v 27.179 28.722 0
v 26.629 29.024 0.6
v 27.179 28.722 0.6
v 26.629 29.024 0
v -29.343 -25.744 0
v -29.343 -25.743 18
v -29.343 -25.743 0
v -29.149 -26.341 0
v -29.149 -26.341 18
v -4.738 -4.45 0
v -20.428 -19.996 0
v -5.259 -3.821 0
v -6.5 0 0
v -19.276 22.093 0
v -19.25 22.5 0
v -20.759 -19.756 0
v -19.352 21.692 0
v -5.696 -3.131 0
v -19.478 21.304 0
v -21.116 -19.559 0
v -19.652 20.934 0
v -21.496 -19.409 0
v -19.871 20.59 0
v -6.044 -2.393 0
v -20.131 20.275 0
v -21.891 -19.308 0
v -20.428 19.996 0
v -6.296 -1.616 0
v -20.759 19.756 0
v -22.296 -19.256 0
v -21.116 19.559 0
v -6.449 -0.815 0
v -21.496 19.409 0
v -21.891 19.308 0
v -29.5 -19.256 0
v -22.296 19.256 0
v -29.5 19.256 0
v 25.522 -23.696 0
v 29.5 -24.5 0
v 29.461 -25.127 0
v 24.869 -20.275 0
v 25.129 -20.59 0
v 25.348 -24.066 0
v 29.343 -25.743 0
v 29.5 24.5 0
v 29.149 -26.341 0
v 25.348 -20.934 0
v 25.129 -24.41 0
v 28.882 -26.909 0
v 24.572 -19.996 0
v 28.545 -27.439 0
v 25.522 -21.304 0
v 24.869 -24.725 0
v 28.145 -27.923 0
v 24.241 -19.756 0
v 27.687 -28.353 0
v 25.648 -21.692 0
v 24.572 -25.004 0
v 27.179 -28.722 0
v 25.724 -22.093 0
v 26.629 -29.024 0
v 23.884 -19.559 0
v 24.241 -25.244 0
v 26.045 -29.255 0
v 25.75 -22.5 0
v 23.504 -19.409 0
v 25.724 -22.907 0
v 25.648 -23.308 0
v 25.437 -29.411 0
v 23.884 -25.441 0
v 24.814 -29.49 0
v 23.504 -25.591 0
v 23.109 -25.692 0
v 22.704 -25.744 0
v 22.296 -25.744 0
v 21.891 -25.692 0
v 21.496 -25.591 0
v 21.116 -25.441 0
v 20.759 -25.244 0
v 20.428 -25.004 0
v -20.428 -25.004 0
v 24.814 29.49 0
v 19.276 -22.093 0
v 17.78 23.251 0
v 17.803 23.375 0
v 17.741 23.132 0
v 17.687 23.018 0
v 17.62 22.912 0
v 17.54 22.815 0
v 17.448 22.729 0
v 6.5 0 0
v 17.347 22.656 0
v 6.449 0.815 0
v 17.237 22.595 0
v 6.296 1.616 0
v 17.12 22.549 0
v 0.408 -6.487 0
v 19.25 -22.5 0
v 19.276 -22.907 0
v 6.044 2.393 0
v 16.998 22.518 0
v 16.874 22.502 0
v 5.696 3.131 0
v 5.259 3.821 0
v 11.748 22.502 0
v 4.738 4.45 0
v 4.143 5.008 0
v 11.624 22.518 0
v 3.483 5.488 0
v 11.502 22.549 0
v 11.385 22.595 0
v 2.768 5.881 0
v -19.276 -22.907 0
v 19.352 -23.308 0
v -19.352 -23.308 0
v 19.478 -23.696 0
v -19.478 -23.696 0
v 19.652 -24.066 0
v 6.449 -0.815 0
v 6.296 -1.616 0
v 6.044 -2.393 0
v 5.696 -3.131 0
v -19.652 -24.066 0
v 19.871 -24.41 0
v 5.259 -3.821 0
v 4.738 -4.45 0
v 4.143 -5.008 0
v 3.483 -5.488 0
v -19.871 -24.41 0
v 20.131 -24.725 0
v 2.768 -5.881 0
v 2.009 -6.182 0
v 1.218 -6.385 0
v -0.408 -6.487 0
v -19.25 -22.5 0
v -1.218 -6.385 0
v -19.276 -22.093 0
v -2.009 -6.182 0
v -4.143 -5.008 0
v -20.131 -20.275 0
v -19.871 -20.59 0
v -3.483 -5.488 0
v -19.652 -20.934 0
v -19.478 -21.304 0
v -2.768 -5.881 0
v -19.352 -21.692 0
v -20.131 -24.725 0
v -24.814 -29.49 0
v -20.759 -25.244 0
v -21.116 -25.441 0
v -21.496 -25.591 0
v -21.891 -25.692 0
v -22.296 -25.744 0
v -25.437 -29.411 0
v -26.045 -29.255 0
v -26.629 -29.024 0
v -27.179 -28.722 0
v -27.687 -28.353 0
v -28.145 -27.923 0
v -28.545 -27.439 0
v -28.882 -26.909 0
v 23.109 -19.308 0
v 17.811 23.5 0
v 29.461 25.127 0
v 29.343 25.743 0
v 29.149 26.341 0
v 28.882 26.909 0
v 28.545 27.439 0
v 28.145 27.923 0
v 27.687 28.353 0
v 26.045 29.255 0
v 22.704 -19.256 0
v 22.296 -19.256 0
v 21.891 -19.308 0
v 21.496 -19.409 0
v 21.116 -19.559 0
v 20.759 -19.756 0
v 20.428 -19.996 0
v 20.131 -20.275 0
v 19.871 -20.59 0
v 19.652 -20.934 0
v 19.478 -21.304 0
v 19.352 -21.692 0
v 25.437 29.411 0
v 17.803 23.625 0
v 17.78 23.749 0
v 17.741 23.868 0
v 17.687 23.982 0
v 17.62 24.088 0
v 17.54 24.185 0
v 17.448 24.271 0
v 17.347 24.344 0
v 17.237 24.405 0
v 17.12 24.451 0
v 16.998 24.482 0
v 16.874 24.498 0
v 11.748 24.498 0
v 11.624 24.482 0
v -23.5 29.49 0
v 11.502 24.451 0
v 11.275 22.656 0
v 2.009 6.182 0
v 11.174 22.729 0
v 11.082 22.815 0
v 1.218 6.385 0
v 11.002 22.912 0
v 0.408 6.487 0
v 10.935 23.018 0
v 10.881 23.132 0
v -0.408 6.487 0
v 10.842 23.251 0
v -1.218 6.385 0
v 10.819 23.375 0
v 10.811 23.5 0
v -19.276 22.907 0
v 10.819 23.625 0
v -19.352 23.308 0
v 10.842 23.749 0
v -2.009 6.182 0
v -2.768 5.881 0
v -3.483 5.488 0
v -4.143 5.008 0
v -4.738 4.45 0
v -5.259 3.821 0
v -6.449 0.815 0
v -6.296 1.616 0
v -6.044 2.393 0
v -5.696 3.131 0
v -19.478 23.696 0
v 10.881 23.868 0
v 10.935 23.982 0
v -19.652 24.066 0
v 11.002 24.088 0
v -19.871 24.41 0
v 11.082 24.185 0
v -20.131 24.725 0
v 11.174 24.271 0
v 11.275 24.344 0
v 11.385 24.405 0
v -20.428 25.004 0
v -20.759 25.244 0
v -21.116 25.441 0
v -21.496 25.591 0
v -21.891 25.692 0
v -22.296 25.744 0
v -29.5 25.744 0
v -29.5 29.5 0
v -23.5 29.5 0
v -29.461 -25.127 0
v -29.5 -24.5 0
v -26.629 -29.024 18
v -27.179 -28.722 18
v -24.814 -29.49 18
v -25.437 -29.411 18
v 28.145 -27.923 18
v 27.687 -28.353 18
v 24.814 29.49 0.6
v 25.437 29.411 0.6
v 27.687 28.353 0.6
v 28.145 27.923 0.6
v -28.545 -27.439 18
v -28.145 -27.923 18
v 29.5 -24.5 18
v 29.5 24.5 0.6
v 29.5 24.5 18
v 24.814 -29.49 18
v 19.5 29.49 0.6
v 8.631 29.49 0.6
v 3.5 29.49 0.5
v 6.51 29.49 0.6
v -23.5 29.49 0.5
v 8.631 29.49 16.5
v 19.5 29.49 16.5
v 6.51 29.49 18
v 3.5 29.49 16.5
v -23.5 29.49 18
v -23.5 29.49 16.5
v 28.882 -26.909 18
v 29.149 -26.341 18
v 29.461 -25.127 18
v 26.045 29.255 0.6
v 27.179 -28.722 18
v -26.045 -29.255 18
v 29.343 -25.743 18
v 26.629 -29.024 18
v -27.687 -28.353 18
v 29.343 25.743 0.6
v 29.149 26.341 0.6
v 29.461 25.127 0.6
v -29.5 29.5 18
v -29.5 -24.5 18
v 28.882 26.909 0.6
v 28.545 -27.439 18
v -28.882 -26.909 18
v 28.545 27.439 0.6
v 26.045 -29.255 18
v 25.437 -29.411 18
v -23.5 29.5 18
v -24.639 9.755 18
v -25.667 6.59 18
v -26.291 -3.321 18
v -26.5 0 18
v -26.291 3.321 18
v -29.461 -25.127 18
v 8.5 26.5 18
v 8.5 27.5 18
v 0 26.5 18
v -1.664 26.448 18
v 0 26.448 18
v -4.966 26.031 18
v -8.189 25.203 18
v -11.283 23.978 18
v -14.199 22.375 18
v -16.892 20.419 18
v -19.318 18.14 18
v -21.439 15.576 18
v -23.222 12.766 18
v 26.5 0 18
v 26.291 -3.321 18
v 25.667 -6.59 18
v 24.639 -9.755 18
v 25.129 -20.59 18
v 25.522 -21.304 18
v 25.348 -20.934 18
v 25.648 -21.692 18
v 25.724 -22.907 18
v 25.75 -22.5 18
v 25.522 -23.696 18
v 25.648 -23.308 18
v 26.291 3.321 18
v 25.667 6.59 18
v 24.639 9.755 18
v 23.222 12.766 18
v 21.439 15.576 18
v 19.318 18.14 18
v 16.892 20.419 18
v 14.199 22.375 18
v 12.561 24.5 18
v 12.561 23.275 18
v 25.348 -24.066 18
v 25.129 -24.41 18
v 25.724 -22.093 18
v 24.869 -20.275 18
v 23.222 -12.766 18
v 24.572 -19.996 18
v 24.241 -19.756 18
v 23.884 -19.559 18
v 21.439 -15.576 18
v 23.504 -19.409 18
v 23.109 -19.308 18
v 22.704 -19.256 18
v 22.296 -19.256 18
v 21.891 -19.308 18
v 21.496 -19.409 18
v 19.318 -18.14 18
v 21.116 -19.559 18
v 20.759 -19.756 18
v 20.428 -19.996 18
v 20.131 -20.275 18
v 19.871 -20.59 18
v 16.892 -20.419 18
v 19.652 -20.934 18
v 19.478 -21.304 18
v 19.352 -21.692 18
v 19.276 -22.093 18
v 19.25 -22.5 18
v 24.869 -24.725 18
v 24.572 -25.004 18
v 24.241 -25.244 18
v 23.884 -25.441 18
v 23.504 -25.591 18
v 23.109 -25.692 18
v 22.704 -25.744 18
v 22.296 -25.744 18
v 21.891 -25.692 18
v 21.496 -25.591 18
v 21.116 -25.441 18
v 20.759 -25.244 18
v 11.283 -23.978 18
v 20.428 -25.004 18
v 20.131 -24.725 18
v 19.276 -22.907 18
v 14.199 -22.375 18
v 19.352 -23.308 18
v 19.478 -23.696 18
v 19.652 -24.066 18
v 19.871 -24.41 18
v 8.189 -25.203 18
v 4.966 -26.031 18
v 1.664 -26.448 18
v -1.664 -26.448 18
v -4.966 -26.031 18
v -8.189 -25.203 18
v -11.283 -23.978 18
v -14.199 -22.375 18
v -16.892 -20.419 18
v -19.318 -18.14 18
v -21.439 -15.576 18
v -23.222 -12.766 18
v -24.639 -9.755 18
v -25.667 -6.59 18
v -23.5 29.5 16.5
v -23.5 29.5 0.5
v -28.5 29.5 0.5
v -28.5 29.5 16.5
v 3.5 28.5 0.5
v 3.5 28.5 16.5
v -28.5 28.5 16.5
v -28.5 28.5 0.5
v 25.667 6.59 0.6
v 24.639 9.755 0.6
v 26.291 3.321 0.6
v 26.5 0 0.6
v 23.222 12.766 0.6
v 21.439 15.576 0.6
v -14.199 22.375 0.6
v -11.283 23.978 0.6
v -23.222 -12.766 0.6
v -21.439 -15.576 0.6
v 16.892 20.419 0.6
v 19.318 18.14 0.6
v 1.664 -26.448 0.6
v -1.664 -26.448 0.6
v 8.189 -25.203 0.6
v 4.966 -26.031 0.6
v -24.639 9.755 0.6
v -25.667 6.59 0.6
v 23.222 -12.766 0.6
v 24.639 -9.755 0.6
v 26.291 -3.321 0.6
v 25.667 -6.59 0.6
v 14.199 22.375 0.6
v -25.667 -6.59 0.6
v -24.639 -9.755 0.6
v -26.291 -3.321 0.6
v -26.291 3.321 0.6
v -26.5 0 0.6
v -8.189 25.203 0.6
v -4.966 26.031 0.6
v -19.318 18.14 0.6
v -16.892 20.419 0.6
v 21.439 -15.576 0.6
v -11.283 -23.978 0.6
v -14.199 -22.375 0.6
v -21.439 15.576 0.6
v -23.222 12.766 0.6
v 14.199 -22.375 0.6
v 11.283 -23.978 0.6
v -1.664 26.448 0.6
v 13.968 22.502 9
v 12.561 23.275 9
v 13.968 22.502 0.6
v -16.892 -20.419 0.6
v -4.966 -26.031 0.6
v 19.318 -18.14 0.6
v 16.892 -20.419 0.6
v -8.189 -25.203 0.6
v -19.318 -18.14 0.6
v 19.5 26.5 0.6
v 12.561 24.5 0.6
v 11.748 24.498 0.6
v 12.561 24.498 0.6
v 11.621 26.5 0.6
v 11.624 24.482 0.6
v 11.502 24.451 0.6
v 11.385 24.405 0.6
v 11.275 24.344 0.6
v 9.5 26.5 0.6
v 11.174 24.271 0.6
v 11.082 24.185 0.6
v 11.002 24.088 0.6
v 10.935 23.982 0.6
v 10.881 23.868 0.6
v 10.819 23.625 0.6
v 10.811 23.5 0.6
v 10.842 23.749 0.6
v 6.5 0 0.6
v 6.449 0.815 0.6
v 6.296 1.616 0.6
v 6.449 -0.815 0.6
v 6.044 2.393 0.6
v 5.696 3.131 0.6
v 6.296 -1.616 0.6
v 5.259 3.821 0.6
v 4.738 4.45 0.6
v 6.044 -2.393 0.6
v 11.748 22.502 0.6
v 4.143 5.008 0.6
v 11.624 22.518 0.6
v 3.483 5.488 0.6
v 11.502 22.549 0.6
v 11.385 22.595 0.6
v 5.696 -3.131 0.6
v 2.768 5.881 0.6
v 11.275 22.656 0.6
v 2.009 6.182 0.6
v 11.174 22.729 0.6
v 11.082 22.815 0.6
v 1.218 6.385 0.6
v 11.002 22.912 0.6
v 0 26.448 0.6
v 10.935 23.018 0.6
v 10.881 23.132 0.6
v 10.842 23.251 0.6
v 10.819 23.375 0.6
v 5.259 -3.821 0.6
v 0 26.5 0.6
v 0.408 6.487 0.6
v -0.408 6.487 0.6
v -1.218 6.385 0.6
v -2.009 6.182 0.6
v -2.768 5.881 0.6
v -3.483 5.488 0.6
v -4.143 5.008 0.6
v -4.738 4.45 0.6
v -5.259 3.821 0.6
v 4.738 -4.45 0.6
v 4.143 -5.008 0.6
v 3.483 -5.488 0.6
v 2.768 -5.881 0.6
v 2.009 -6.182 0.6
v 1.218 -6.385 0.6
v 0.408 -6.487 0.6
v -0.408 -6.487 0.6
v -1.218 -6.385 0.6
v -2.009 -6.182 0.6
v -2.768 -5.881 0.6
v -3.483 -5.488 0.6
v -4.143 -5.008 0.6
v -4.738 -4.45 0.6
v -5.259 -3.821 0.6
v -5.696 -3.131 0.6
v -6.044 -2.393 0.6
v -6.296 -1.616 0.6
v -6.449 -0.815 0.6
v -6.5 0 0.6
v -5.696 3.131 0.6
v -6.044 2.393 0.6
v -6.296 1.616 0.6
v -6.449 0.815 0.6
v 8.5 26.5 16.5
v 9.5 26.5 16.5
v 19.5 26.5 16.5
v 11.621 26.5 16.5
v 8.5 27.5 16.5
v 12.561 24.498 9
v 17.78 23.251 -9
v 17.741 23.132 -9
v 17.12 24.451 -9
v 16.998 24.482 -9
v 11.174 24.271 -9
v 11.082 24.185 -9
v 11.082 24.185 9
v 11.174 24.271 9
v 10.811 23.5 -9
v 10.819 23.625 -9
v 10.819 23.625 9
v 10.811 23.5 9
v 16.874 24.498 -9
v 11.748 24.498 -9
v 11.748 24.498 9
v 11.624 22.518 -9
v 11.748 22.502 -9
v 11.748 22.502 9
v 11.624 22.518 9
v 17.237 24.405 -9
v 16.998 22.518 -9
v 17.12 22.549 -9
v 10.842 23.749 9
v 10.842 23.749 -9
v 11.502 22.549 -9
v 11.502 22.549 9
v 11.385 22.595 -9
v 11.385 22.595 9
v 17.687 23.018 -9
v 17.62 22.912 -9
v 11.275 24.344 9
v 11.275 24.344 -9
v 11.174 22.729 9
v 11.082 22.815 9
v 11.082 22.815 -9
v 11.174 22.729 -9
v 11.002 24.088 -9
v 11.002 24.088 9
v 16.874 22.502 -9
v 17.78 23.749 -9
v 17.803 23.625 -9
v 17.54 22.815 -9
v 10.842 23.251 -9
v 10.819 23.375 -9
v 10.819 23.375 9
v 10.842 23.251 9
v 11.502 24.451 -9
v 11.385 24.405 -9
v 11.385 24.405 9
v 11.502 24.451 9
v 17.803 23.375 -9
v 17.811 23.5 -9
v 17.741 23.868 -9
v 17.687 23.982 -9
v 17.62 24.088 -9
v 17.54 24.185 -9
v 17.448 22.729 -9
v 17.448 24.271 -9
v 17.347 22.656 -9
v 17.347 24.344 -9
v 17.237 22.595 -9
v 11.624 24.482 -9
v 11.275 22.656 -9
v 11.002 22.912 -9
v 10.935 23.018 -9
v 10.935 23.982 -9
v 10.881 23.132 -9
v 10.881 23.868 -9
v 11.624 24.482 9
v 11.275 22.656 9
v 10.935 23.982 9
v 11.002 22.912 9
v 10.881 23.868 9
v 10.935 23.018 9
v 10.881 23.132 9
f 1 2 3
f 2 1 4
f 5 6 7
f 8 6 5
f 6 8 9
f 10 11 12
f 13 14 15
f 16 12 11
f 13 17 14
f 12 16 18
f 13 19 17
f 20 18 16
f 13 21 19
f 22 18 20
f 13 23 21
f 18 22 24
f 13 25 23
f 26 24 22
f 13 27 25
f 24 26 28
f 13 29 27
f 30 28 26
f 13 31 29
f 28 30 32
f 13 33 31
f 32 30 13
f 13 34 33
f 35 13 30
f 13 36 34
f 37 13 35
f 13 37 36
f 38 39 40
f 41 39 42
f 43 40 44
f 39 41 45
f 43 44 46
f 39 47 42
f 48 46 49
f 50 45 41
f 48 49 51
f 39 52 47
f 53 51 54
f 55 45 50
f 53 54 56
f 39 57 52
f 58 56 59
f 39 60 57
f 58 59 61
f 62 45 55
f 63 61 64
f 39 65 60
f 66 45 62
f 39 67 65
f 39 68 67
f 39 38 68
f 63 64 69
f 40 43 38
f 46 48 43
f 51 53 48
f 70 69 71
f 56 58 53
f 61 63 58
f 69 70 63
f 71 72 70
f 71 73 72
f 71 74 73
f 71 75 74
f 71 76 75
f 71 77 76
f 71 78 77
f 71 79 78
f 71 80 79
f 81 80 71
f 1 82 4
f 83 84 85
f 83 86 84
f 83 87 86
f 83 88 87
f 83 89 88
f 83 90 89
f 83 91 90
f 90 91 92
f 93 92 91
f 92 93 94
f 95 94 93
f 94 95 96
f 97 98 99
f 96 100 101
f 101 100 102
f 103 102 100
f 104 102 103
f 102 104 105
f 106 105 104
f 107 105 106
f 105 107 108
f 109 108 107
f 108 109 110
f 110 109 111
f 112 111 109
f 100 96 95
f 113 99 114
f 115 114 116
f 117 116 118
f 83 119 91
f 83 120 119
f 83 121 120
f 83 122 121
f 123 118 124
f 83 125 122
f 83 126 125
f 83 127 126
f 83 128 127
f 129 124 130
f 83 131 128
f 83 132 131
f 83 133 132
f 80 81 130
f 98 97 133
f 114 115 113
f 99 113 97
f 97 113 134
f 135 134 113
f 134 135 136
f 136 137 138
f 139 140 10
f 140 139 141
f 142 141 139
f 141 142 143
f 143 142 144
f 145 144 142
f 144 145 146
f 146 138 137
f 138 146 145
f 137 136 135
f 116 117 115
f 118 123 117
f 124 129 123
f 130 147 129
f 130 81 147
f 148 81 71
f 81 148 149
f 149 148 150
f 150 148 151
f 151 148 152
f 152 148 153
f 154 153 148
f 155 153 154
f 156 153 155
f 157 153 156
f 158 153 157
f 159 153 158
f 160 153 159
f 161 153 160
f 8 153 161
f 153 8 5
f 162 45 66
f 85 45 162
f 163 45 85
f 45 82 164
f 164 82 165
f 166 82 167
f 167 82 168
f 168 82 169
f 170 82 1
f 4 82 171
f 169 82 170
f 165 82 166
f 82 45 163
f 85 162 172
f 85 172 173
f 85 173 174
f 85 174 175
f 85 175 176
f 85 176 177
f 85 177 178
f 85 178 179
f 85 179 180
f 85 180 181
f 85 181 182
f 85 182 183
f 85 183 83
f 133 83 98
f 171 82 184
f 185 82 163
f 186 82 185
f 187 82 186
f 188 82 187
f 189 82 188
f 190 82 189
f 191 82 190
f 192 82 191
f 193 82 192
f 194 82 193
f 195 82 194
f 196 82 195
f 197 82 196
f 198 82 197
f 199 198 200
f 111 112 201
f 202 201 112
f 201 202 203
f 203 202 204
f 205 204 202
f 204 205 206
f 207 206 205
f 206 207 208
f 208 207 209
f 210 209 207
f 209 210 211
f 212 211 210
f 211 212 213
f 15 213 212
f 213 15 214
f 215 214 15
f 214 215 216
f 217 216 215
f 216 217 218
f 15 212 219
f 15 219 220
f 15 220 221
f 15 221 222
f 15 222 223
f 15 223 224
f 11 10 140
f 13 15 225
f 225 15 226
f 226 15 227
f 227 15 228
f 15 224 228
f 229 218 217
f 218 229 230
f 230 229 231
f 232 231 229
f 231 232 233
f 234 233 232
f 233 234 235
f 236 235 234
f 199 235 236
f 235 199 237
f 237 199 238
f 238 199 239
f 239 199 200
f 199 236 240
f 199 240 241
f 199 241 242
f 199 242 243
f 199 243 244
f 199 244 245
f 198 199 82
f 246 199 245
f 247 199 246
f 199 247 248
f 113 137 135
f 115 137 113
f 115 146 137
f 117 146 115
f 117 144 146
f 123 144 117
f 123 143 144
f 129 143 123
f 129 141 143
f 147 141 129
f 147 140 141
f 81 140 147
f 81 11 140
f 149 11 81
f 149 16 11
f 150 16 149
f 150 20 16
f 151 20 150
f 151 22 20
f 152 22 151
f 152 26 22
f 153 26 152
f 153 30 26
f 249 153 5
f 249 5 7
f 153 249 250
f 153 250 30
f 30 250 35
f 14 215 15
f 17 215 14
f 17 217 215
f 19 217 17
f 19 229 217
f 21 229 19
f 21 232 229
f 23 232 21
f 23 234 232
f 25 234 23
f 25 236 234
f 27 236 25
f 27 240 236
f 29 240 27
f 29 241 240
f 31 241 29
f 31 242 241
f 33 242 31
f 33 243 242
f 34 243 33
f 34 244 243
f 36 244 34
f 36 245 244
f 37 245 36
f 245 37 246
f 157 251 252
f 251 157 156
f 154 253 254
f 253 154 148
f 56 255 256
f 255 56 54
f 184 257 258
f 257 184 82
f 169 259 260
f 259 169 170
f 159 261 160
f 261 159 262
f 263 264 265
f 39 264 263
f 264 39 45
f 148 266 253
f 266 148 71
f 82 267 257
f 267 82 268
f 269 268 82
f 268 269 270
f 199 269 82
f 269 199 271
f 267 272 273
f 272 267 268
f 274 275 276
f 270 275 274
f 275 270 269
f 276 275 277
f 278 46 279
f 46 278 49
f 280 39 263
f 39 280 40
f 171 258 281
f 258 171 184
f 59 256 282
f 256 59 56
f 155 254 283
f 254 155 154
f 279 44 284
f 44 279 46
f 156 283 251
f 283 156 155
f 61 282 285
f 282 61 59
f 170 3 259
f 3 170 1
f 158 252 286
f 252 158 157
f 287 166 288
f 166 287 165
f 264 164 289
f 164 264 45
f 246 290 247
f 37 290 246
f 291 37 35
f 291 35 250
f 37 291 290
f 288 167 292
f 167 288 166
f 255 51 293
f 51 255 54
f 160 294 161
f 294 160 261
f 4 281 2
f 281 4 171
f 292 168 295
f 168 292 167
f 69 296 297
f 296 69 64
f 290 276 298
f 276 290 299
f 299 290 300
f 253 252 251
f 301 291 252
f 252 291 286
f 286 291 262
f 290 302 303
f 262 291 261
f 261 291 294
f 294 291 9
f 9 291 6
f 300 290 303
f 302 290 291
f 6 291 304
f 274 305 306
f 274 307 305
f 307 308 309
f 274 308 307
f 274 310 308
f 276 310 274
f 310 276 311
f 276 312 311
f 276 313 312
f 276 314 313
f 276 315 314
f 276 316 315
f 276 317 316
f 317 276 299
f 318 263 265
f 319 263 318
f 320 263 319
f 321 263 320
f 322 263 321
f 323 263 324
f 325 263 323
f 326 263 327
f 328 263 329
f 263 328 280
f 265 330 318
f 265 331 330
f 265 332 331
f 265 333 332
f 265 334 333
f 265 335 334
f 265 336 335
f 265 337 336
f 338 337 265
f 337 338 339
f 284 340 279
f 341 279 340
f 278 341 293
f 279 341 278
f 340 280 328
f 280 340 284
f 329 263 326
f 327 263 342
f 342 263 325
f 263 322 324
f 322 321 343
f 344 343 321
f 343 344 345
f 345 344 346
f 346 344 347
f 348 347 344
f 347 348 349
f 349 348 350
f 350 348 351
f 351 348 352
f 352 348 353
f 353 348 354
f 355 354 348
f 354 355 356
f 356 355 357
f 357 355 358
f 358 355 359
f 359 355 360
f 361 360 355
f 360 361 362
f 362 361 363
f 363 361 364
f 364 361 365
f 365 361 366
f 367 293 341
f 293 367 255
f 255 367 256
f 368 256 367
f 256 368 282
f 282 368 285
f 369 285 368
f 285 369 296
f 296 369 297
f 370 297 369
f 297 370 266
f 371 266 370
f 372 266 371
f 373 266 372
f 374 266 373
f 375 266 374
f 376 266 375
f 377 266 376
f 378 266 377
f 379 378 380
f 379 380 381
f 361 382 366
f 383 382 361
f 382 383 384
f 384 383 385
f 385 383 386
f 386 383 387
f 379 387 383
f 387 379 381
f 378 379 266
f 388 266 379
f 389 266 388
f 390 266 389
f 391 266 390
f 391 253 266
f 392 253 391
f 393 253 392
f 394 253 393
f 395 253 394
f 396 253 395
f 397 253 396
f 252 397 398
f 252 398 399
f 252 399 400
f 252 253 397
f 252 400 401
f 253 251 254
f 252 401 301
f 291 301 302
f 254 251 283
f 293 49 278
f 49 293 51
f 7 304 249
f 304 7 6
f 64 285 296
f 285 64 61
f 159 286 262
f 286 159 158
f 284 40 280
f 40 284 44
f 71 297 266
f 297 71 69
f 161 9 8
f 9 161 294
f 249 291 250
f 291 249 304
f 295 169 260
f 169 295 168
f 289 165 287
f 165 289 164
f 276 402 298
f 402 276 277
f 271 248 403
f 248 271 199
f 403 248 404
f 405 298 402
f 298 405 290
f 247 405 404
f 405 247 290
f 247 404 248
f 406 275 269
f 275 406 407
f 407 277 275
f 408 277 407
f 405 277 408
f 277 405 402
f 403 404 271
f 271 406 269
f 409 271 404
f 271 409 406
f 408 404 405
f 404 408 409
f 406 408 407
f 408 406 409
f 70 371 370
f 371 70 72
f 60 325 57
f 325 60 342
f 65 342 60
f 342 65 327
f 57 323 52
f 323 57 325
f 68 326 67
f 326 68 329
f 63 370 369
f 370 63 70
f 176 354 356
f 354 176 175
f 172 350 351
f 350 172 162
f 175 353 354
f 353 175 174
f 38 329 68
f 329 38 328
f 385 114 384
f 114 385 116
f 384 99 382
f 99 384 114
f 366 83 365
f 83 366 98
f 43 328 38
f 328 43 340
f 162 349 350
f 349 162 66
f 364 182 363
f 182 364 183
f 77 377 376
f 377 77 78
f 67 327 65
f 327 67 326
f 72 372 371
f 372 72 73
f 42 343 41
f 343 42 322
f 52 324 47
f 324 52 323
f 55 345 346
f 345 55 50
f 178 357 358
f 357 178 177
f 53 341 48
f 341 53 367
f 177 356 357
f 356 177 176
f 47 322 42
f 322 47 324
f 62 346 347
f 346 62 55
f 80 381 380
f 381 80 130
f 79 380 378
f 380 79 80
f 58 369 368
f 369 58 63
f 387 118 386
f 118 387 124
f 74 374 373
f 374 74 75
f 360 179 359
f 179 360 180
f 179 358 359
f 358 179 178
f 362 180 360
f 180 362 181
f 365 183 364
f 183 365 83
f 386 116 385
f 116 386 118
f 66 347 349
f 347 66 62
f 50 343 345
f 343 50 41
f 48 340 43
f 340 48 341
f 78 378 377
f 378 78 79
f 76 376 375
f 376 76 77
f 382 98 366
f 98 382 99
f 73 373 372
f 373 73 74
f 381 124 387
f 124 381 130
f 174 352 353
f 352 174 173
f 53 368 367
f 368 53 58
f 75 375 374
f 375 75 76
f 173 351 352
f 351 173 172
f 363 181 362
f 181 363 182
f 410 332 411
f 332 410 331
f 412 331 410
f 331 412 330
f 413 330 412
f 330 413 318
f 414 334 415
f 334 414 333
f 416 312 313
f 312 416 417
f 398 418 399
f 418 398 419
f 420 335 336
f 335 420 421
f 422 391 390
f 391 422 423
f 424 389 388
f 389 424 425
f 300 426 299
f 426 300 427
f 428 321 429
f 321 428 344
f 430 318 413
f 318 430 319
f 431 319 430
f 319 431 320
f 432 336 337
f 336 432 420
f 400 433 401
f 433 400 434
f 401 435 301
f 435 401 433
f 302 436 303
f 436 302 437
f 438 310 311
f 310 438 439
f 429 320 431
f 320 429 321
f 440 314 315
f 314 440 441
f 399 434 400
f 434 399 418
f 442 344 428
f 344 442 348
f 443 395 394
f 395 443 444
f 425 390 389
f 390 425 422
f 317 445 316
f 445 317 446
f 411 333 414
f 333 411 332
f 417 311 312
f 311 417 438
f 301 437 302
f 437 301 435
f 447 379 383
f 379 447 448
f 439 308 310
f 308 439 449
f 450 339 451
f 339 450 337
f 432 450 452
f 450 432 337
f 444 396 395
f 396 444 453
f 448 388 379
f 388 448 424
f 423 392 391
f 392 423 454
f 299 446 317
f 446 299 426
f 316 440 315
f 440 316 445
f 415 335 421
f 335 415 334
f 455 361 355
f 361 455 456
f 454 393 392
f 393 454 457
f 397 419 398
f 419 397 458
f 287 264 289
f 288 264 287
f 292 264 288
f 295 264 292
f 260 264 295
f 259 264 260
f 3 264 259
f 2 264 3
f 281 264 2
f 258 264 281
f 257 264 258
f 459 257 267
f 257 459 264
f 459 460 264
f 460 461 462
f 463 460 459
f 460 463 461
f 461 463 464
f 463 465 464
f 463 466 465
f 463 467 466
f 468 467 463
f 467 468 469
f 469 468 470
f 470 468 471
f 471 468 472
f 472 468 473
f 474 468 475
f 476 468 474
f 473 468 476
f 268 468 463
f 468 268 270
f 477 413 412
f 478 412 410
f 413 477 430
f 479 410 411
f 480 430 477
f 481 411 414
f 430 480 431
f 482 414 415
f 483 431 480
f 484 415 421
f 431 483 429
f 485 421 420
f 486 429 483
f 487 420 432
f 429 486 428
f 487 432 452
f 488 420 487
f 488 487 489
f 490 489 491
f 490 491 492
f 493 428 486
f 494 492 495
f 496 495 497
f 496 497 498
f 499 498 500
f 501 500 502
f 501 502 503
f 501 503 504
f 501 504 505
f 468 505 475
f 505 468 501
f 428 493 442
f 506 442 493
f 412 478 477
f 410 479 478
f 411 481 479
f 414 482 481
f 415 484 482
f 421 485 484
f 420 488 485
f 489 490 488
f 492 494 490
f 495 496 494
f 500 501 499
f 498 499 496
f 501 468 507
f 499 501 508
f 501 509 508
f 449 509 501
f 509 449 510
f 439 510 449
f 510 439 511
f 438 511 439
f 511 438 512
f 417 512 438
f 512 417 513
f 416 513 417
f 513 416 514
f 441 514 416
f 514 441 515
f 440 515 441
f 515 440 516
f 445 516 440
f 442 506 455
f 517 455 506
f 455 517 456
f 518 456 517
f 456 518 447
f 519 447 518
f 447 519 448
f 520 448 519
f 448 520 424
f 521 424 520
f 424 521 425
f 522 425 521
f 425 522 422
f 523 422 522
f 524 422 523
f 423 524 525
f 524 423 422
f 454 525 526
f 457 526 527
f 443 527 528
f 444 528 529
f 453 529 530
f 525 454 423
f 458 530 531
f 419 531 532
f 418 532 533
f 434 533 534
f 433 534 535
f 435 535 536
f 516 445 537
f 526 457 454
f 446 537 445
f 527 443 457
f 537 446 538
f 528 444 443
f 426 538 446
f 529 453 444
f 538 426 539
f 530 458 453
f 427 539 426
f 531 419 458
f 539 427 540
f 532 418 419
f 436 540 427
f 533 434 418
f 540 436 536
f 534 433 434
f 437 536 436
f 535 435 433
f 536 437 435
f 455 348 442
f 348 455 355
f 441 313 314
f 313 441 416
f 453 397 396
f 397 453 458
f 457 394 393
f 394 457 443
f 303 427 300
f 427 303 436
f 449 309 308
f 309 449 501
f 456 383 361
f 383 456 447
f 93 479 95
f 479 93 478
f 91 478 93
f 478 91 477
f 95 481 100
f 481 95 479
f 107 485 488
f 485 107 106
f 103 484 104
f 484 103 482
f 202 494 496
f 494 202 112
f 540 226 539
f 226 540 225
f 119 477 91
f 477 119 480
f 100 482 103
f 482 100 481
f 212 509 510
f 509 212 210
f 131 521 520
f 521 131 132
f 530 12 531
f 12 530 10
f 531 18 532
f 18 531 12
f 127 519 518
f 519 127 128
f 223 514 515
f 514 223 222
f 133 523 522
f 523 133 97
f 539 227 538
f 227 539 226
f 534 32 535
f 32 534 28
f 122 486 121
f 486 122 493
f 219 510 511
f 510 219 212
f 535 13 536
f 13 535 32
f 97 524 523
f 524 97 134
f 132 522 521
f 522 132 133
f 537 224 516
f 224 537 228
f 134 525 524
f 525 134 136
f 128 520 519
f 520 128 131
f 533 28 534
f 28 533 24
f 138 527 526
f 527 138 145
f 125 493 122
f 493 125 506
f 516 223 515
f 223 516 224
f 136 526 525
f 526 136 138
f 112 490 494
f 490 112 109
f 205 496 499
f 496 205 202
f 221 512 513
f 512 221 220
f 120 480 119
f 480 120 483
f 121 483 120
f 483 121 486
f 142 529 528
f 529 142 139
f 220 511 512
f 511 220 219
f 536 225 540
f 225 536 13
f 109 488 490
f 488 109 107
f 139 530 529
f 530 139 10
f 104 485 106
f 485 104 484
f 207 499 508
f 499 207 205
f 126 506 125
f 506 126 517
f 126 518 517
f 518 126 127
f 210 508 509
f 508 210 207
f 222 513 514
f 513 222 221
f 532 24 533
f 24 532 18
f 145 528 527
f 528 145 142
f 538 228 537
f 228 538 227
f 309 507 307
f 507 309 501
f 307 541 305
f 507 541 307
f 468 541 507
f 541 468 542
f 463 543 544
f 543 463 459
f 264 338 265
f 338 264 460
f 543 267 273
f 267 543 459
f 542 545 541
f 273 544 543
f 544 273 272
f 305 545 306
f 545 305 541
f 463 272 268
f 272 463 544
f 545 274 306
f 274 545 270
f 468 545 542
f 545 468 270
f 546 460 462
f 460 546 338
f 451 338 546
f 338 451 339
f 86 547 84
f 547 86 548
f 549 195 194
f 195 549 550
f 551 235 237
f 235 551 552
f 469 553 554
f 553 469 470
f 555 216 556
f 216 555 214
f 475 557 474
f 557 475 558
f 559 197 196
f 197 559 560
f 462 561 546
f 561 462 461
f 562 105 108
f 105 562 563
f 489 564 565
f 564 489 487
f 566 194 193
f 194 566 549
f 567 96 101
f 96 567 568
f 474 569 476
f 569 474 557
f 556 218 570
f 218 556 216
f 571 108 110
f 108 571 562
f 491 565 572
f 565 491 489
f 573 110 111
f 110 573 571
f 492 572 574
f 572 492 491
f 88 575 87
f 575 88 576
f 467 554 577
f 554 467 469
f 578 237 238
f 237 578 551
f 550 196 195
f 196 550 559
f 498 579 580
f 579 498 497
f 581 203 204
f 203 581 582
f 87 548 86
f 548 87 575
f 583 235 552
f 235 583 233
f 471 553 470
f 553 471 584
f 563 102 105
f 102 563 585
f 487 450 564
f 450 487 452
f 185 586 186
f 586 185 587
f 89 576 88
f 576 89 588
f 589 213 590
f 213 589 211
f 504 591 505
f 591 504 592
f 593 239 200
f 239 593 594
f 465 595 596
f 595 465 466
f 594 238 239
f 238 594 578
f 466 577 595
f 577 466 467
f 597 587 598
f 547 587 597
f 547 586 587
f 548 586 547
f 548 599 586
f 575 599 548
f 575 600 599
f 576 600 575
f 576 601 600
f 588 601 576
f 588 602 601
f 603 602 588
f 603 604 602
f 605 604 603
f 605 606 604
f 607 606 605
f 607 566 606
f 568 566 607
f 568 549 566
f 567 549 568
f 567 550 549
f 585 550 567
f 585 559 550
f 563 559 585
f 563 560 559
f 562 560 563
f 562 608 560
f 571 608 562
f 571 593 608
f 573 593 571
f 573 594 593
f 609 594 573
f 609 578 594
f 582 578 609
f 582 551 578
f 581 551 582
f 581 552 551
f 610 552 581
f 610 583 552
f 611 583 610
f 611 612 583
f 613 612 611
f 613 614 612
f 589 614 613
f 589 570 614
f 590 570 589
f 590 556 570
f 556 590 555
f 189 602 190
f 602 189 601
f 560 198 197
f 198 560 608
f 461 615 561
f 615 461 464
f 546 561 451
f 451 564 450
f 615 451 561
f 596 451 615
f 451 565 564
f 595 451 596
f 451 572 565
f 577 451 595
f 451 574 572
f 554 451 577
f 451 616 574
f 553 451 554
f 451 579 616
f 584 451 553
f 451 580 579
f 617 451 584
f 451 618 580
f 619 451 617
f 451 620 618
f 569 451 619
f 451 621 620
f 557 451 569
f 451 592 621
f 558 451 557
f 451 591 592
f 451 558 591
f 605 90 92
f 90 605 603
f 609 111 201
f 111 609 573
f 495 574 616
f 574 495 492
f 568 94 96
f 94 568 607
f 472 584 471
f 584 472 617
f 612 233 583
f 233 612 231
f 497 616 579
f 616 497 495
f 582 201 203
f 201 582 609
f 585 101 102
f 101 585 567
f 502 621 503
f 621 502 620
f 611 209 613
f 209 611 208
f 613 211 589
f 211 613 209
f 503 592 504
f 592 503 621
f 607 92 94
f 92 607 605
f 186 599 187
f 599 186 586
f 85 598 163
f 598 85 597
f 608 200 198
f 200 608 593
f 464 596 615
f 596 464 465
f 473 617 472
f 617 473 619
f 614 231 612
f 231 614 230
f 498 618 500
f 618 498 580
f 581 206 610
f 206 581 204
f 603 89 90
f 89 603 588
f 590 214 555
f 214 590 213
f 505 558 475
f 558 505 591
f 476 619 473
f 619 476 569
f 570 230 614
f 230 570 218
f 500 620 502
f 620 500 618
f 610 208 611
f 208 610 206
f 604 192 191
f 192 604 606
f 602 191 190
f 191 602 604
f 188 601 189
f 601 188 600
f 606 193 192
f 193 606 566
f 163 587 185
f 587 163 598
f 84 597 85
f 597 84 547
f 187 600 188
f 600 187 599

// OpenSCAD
$fn = 50;


union() {
	difference() {
		union() {
			hull() {
				translate(v = [-24.5000000000, 24.5000000000, 0]) {
					cylinder(h = 18, r = 5);
				}
				translate(v = [24.5000000000, 24.5000000000, 0]) {
					cylinder(h = 18, r = 5);
				}
				translate(v = [-24.5000000000, -24.5000000000, 0]) {
					cylinder(h = 18, r = 5);
				}
				translate(v = [24.5000000000, -24.5000000000, 0]) {
					cylinder(h = 18, r = 5);
				}
			}
			translate(v = [-29.5000000000, 23.5000000000, 0]) {
				cube(size = [6, 6, 18]);
			}
		}
		union() {
			translate(v = [-30.0000000000, -22.5000000000, -250.0000000000]) {
				rotate(a = [0, 0, 0]) {
					difference() {
						union() {
							hull() {
								translate(v = [7.5000000000, 0, 0]) {
									cylinder(h = 250, r = 3.2500000000, r1 = 3.2500000000, r2 = 3.2500000000);
								}
								translate(v = [-7.5000000000, 0, 0]) {
									cylinder(h = 250, r = 3.2500000000, r1 = 3.2500000000, r2 = 3.2500000000);
								}
							}
						}
						union();
					}
				}
			}
			translate(v = [-30.0000000000, 22.5000000000, -250.0000000000]) {
				rotate(a = [0, 0, 0]) {
					difference() {
						union() {
							hull() {
								translate(v = [7.5000000000, 0, 0]) {
									cylinder(h = 250, r = 3.2500000000, r1 = 3.2500000000, r2 = 3.2500000000);
								}
								translate(v = [-7.5000000000, 0, 0]) {
									cylinder(h = 250, r = 3.2500000000, r1 = 3.2500000000, r2 = 3.2500000000);
								}
							}
						}
						union();
					}
				}
			}
			translate(v = [-28.5000000000, 28.5000000000, 0.5000000000]) {
				cube(size = [32, 1, 16]);
			}
			translate(v = [22.5000000000, -22.5000000000, 0]) {
				cylinder(h = 100, r = 3.2500000000);
			}
			translate(v = [0, 0, 0.6000000000]) {
				cylinder(h = 20.4000000000, r = 26.5000000000);
			}
			translate(v = [0, 0, -9.0000000000]) {
				cylinder(h = 18, r = 6.5000000000);
			}
			translate(v = [0.0000000000, 24.5000000000, 0.6000000000]) {
				cube(size = [29.5000000000, 2, 20.4000000000]);
			}
			translate(v = [19.5000000000, 24.5000000000, 0.6000000000]) {
				cube(size = [10, 5, 20.4000000000]);
			}
			translate(v = [8.5000000000, 24.5000000000, 16.5000000000]) {
				cube(size = [21, 5, 1.5000000000]);
			}
			translate(v = [5.7500000000, 30.2500000000, 0.6000000000]) {
				rotate(a = [0, 0, -45]) {
					cube(size = [7.5000000000, 1.5000000000, 20.4000000000]);
				}
			}
			translate(v = [5.0610000000, 22.5000000000, 0.6000000000]) {
				cube(size = [7.5000000000, 2, 17.4000000000]);
			}
		}
	}
	union() {
		translate(v = [14.3110000000, 23.5000000000, -9.0000000000]) {
			rotate(a = [0, 0, 0]) {
				difference() {
					union() {
						#hull() {
							#translate(v = [2.5000000000, 0, 0]) {
								cylinder(h = 18, r = 1.0000000000, r1 = 1.0000000000, r2 = 1.0000000000);
							}
							#translate(v = [-2.5000000000, 0, 0]) {
								cylinder(h = 18, r = 1.0000000000, r1 = 1.0000000000, r2 = 1.0000000000);
							}
						}
					}
					union();
				}
			}
		}
	}
}
